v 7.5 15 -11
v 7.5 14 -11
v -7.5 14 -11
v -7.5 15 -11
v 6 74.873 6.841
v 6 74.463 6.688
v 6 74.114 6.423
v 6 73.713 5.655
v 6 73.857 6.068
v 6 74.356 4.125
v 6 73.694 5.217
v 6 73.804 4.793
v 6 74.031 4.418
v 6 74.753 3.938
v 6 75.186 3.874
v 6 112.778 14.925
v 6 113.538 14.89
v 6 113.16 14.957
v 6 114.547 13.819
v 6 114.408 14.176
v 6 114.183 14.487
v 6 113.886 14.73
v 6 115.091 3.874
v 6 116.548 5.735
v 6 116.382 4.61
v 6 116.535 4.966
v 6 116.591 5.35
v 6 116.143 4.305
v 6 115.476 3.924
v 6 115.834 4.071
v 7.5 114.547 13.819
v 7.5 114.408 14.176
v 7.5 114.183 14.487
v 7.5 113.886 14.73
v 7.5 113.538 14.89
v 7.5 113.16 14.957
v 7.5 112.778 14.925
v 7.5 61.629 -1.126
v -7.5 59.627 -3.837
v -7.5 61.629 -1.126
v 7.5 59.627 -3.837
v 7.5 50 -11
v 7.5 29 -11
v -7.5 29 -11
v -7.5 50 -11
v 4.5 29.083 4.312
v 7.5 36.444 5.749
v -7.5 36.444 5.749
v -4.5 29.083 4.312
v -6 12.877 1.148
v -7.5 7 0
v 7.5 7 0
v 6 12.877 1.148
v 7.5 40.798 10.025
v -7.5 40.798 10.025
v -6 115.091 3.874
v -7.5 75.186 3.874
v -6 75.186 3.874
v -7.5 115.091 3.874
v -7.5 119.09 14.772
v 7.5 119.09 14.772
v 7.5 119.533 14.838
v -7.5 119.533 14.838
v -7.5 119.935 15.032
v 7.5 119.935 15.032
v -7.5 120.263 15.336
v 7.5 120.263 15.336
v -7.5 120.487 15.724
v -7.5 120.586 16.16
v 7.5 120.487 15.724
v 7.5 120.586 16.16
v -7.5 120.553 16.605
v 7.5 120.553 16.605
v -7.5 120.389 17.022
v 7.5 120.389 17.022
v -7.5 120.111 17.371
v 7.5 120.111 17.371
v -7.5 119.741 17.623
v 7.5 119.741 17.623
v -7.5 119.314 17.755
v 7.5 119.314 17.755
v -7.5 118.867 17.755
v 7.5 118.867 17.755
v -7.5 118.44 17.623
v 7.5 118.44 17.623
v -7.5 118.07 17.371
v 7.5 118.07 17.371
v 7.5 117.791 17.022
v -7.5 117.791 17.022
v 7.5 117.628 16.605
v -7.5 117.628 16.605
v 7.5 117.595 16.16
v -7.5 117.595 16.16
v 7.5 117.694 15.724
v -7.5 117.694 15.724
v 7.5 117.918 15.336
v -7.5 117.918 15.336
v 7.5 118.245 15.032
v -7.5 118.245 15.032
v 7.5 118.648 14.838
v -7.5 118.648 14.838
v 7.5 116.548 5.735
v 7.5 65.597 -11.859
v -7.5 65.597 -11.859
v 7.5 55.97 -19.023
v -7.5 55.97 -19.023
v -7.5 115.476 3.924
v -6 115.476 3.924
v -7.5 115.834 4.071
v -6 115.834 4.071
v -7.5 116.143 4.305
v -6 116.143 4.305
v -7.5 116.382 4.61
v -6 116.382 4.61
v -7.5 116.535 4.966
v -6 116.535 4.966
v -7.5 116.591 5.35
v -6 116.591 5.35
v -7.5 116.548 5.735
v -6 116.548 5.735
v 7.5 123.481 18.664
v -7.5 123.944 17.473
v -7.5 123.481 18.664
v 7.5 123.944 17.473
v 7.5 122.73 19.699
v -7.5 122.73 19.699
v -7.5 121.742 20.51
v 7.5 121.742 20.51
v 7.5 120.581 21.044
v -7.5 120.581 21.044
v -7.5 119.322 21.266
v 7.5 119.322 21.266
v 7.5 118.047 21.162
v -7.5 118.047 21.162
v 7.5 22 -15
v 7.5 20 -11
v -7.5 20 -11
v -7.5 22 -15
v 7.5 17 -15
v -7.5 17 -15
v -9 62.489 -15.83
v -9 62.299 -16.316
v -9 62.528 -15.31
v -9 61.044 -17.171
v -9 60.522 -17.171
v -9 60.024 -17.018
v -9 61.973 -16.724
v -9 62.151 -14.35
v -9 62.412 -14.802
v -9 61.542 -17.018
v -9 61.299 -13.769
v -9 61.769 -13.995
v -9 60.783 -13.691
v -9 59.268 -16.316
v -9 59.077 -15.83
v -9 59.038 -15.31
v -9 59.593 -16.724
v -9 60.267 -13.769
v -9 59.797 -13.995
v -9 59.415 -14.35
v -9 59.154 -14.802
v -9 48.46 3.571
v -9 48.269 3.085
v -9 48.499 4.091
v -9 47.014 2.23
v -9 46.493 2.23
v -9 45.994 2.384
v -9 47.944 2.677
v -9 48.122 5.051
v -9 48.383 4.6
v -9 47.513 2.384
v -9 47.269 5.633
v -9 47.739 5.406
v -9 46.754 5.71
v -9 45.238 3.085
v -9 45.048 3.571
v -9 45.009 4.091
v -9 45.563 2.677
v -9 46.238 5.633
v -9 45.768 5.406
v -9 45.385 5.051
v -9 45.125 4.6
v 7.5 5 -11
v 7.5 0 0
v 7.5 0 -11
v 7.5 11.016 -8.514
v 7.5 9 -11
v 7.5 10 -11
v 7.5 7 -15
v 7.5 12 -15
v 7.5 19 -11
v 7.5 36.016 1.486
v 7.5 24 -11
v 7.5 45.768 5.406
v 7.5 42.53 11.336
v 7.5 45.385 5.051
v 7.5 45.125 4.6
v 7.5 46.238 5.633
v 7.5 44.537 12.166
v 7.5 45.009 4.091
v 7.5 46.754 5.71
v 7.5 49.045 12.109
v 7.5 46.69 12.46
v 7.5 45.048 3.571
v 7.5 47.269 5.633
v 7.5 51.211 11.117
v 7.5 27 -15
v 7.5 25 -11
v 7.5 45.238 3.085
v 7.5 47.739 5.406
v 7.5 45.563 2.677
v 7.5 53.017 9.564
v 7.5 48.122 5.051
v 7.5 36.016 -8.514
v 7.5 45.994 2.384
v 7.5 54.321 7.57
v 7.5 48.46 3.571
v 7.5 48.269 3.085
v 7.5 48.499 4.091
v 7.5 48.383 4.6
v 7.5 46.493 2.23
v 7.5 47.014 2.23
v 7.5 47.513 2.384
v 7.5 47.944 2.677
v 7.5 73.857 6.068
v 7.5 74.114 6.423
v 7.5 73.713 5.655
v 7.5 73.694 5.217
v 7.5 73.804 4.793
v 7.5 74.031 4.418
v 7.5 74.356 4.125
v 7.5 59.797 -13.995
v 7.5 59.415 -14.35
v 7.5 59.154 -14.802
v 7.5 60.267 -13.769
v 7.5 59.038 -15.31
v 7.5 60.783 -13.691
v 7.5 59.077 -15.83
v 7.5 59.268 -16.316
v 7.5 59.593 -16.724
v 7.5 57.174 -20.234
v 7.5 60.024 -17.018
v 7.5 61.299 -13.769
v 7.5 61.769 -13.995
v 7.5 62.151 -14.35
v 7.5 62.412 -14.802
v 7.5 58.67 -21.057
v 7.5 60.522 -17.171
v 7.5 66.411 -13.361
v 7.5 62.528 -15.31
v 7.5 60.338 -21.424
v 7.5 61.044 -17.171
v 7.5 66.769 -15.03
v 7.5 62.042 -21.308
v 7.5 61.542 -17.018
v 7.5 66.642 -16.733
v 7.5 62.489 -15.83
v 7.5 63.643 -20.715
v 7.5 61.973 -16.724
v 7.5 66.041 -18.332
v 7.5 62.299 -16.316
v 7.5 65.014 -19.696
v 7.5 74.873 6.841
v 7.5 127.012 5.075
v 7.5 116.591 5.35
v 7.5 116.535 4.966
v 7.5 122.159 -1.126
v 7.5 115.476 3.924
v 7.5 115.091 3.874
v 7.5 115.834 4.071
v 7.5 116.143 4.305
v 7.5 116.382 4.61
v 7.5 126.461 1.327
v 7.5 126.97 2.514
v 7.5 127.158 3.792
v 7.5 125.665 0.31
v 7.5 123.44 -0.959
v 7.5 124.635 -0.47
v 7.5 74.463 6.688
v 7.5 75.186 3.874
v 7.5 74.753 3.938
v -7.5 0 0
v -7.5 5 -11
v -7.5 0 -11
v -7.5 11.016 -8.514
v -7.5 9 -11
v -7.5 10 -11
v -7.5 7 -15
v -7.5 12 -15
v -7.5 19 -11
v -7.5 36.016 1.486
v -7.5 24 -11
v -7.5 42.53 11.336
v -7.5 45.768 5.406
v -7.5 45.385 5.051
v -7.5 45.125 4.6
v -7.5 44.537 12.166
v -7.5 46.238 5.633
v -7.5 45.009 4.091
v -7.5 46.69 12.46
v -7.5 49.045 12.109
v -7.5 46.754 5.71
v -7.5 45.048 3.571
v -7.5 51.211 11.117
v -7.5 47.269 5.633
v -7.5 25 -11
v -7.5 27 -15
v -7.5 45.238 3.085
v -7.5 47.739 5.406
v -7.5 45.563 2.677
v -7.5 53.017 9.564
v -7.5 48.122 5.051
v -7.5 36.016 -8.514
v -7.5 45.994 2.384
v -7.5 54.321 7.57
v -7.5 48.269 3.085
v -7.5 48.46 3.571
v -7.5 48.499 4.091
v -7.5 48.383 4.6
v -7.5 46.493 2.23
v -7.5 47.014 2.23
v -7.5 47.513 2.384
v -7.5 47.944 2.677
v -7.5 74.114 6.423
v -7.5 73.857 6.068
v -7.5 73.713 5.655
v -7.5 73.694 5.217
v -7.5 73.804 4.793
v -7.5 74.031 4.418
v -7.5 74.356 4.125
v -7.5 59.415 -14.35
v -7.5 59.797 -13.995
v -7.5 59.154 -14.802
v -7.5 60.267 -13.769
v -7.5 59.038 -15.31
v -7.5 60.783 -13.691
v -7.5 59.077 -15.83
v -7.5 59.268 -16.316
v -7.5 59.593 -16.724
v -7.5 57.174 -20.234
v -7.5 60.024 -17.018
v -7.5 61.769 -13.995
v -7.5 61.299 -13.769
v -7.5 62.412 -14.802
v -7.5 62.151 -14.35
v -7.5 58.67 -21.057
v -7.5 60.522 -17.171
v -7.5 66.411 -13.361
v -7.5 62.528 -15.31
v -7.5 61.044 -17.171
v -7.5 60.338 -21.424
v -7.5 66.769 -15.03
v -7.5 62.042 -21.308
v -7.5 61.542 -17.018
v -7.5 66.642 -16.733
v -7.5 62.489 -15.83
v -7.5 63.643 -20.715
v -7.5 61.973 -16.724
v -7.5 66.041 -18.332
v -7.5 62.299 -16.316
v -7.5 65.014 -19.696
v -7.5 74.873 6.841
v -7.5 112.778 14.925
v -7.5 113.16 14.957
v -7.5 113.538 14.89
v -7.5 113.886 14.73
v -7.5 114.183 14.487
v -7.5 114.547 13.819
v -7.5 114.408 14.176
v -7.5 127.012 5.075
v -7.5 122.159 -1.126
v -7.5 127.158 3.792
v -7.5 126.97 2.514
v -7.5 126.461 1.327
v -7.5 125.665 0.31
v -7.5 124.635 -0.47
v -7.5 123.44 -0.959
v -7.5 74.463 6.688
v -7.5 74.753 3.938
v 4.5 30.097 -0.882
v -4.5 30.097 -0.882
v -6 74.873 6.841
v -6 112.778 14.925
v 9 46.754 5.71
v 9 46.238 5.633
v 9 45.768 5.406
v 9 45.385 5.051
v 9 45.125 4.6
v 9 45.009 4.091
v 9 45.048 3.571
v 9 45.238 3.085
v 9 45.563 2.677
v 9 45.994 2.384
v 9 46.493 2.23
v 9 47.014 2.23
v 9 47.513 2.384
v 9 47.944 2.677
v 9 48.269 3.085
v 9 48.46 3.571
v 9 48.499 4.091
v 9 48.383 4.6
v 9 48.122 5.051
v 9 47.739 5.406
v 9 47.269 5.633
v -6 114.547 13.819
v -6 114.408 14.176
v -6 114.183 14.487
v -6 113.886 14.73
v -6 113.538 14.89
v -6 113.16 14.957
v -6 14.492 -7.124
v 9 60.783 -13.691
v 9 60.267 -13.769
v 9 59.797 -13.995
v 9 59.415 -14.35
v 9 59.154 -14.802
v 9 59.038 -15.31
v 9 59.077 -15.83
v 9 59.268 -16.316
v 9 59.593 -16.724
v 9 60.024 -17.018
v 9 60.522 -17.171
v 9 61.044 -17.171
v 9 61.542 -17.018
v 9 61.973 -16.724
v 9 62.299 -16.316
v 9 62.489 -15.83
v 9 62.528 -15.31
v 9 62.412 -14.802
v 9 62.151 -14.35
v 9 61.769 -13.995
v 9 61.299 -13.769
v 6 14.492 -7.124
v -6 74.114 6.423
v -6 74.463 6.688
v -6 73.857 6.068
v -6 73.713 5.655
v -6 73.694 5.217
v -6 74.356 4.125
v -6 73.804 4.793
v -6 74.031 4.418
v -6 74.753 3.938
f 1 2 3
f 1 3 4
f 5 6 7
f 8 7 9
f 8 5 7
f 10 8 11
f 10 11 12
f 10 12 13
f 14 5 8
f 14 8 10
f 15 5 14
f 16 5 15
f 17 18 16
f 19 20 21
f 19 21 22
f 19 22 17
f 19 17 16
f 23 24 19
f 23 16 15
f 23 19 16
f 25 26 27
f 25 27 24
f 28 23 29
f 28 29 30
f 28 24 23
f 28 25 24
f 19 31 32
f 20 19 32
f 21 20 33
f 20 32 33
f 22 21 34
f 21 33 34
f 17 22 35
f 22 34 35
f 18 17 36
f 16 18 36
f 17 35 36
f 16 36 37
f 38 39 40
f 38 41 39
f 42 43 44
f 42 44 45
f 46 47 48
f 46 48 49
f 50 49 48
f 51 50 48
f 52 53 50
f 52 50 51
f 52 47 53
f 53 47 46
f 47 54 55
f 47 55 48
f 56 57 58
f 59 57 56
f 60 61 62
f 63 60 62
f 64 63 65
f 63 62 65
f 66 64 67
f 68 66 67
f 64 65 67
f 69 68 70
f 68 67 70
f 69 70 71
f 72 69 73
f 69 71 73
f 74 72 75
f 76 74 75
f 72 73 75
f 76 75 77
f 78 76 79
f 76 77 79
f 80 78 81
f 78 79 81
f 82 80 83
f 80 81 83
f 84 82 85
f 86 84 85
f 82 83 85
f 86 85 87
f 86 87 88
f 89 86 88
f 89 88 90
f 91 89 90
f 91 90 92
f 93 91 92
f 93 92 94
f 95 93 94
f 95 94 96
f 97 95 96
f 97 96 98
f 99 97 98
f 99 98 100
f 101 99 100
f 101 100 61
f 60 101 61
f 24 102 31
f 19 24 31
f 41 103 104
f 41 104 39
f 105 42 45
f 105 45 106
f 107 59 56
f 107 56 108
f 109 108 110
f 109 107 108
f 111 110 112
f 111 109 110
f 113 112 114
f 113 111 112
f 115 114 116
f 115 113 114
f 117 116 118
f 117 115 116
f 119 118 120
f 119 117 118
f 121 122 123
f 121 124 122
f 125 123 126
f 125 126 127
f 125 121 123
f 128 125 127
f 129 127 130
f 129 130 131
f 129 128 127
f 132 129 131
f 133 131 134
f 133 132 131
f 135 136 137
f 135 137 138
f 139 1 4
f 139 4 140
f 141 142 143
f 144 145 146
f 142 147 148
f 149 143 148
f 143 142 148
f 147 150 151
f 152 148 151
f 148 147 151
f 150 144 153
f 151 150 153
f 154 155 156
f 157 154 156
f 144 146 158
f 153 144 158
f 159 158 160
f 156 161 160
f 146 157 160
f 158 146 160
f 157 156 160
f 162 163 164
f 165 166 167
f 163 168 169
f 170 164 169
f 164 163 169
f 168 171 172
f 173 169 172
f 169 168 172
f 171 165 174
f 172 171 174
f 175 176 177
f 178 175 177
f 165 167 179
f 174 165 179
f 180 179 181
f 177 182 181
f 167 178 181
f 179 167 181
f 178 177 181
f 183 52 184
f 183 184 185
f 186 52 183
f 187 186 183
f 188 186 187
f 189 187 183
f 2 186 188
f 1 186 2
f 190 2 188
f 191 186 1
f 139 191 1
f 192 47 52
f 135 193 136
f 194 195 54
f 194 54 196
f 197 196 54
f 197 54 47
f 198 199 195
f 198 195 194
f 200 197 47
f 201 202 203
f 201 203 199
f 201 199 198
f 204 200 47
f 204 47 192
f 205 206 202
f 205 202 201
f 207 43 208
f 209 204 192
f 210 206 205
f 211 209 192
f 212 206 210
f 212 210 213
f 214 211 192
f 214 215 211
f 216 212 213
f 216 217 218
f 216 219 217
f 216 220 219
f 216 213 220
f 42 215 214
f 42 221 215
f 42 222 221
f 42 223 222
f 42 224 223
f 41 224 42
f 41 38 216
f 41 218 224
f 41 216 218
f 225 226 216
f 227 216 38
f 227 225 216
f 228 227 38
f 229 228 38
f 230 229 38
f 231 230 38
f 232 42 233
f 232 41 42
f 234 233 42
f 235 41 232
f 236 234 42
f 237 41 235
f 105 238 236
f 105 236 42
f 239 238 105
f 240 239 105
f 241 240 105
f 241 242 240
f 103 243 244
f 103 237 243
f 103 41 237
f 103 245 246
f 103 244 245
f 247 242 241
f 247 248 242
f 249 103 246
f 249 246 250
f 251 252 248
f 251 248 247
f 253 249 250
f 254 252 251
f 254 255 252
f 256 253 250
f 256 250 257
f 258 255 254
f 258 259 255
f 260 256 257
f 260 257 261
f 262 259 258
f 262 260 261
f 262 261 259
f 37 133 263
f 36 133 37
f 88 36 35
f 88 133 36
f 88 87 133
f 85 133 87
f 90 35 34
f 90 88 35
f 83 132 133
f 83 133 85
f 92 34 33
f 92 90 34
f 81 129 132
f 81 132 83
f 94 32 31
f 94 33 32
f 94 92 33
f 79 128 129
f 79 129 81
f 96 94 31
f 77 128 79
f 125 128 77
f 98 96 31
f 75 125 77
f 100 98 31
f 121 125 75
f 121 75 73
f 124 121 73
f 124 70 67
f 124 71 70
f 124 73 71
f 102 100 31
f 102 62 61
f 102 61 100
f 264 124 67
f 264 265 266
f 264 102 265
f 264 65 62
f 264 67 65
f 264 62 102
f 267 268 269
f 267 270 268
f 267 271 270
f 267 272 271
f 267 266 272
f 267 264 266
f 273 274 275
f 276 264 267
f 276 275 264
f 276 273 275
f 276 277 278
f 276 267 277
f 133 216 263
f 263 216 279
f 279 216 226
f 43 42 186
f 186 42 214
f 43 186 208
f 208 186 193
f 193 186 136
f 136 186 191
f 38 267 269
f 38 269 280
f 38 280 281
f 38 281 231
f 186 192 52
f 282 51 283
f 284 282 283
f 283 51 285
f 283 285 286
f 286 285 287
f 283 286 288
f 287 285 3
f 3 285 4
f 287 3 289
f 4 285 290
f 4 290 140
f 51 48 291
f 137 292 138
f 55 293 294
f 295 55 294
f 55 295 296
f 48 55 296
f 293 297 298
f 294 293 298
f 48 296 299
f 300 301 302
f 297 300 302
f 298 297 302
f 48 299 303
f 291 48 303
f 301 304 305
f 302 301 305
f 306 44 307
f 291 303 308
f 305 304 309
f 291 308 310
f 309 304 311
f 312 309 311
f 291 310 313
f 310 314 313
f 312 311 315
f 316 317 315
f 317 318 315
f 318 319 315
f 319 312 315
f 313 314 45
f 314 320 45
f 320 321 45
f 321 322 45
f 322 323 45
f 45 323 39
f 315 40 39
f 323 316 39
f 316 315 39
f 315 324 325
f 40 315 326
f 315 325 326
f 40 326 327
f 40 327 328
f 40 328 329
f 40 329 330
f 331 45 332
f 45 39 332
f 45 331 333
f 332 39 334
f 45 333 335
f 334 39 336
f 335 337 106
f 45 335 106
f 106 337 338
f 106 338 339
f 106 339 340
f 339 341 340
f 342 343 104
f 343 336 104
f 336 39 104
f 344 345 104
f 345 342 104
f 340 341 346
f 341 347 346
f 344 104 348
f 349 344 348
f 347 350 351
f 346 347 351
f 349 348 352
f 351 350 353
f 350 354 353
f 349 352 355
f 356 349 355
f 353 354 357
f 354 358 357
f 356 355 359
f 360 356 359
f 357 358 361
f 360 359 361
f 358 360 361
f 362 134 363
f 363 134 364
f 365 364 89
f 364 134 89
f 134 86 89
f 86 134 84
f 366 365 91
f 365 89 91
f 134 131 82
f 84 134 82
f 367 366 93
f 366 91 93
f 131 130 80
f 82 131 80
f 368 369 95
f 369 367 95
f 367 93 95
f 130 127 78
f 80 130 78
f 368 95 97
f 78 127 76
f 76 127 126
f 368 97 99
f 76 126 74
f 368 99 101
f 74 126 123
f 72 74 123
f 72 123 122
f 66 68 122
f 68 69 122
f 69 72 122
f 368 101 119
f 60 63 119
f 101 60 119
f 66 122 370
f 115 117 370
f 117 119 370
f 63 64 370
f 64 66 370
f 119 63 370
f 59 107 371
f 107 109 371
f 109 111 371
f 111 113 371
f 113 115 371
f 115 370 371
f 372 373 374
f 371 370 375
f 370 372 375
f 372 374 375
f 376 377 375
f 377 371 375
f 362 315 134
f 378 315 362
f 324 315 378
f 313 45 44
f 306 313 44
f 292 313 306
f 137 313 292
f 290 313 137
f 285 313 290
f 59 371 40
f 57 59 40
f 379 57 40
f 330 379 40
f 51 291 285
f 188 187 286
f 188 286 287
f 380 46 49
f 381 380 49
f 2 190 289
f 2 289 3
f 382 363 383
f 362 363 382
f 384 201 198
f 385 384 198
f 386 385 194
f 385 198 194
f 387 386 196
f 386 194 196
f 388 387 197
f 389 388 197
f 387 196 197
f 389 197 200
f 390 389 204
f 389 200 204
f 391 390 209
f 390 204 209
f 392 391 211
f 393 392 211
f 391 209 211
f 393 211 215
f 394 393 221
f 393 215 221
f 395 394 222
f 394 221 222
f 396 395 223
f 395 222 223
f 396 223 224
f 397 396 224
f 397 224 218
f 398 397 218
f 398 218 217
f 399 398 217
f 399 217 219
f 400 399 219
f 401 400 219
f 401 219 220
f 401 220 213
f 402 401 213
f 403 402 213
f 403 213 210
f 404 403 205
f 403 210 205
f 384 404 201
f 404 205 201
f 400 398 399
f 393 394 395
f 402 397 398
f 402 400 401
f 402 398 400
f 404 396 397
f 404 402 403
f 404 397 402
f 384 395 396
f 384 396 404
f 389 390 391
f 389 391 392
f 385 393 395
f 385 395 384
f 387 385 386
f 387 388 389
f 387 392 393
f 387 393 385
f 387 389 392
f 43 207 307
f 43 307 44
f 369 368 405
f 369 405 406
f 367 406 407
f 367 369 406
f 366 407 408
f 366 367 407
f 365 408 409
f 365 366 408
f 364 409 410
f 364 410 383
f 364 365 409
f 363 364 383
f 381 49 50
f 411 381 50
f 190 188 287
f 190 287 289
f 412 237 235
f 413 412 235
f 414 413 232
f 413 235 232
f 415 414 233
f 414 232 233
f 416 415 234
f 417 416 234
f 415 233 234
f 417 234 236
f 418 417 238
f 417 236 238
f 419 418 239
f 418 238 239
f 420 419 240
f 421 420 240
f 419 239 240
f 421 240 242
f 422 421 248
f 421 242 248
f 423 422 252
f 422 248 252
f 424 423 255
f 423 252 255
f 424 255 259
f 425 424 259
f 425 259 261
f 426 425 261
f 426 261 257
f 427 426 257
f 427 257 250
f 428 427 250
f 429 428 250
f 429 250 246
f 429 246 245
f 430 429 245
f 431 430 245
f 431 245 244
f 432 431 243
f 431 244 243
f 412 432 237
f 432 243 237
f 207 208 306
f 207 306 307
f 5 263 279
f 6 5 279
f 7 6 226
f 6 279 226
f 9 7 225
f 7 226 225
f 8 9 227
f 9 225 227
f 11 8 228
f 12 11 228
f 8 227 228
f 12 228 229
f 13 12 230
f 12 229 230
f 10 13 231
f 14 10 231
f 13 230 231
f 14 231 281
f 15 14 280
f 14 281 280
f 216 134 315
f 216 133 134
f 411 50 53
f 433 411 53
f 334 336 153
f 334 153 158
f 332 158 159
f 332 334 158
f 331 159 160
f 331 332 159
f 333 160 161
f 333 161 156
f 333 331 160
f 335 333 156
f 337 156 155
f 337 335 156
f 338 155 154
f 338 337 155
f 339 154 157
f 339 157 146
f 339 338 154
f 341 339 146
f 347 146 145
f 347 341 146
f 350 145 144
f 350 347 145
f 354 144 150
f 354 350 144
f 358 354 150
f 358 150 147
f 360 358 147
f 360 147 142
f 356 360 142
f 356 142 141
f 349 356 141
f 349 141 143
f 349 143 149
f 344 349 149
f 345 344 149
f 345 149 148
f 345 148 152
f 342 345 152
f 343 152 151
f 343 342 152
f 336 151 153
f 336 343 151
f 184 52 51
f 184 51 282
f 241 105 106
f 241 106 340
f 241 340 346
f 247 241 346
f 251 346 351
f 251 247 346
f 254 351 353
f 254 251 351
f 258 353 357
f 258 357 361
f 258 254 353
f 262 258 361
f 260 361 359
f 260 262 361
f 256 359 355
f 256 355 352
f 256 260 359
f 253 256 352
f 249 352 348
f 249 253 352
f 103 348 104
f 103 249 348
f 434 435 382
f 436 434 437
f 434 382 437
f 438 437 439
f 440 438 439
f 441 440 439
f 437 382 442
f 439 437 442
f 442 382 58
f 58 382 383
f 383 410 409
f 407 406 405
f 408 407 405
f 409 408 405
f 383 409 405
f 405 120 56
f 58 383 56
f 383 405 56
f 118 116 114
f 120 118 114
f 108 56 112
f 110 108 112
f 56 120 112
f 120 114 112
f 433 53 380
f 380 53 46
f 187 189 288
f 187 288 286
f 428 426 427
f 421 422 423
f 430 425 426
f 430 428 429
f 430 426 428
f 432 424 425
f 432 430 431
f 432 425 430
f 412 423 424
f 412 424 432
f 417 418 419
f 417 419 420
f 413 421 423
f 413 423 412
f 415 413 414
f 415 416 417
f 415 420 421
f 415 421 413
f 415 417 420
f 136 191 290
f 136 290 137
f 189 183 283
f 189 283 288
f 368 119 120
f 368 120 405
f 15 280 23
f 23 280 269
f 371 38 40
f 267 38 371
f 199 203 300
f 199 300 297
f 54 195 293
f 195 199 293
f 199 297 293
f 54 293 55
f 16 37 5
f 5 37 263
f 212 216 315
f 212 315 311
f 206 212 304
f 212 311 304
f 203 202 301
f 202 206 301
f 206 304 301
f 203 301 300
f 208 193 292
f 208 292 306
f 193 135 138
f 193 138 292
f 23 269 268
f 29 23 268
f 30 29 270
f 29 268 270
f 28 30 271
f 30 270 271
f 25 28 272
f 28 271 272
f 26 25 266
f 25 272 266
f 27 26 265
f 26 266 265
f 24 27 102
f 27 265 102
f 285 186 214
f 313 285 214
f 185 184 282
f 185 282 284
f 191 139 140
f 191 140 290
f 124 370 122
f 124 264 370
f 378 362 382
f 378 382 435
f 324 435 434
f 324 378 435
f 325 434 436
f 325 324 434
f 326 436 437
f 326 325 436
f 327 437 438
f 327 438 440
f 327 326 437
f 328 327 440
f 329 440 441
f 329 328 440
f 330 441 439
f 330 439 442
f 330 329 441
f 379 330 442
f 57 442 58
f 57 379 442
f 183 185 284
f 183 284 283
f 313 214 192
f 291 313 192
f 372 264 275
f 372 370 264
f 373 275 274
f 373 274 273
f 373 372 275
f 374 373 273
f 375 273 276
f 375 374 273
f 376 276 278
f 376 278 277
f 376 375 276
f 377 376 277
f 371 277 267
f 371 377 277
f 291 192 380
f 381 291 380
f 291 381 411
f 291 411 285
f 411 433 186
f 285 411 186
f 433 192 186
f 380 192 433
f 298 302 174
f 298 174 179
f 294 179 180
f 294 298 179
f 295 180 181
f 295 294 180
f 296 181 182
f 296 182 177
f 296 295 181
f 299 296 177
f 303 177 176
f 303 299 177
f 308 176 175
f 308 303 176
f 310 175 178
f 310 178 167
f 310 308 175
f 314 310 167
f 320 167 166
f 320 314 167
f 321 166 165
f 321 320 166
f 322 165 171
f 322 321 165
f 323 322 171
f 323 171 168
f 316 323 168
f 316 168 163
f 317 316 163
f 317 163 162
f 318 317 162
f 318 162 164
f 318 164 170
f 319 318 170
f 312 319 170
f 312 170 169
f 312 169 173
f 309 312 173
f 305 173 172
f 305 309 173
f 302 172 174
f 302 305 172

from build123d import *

# Parameters (mm, degrees)
BOSS_EXTRUDE1_DEPTH = 7.5
BOSS_EXTRUDE2_DEPTH = 15
LPATTERN1_COUNT     = 5
LPATTERN1_PITCH     = 5
CUT_EXTRUDE1_DEPTH  = 132.304814948
FILLET1_R           = 8.5
FILLET2_R           = 5
SKETCH4_R           = 1.5
CUT_EXTRUDE2_DEPTH  = 130.82329799
CUT_EXTRUDE3_REACH  = 131.114
SKETCH6_R           = 1.75
BOSS_EXTRUDE3_DEPTH = 1.5
SKETCH7_R           = 1.75
BOSS_EXTRUDE4_DEPTH = 1.5
CUT_EXTRUDE4_DEPTH  = 1.5


with BuildPart() as part:
    # Sketch1 → Boss-Extrude1 (new, symmetric)
    with BuildSketch(Plane(origin=(0, 0, 0), x_dir=(0, 0, -1), z_dir=(1, 0, 0))):
        with BuildLine():
            Line((1.125844004, 128.547240234), (-22.171185278, 122.781095368))
            Line((-22.171185278, 122.781095368), (-7.570249068, 54.320795472))
            Line((-7.570249068, 54.320795472), (-12.460270489, 53.277871457))
            Line((-12.460270489, 53.277871457), (-12.460270489, 43.277871457))
            Line((-12.460270489, 43.277871457), (-5.749067667, 36.443984461))
            Line((-5.749067667, 36.443984461), (0, 7))
            Line((0, 7), (0, 0))
            Line((0, 0), (11, 0))
            Line((11, 0), (11, 50))
            Line((11, 50), (19.022755483, 55.969538882))
            ThreePointArc((19.022755483, 55.969538882), (20.254685443, 64.364915501), (11.859308824, 65.596845461))
            Line((11.859308824, 65.596845461), (3.836553342, 59.627306579))
            Line((3.836553342, 59.627306579), (1.125844004, 61.629450689))
            Line((1.125844004, 61.629450689), (1.125844004, 128.547240234))
        make_face()
    extrude(amount=BOSS_EXTRUDE1_DEPTH, both=True)

    # Sketch2 → Boss-Extrude2 (add)
    with BuildSketch(Plane(origin=(7.5, 0, 0), x_dir=(0, 0, -1), z_dir=(1, 0, 0))):
        Polygon((11, 5), (15, 7), (11, 9), align=None)
    boss_extrude2 = extrude(amount=-BOSS_EXTRUDE2_DEPTH)

    # LPattern1: Boss-Extrude2 ×5
    with Locations(*[(0, i * LPATTERN1_PITCH, 0) for i in range(1, LPATTERN1_COUNT)]):
        add(boss_extrude2)

    # Sketch3 → Cut-Extrude1 (cut, through all)
    with BuildSketch(Plane(origin=(7.5, 0, 0), x_dir=(0, 0, -1), z_dir=(1, 0, 0))):
        Polygon((8.514249155, 11.015619925), (8.514249155, 36.015619925), (-1.485750845, 36.015619925), align=None)
    extrude(amount=-CUT_EXTRUDE1_DEPTH, mode=Mode.SUBTRACT)

    # Fillet1
    # the kernel refuses this fillet: 8.5 mm, written as the material it takes off along each edge
    with BuildSketch(Plane(origin=(-16.189504631, 43.277871457, 12.460270489), x_dir=(0, 1, 0), z_dir=(1, 0, 0))) as fillet1_piece_1:
        with BuildLine():
            CenterArc((FILLET1_R * 0.408917864968, -FILLET1_R), FILLET1_R, 90, 44.481059687)
            Line((-FILLET1_R * 0.29175558125, -FILLET1_R * 0.286517889667), (-FILLET1_R * 0.305769050174, -FILLET1_R * 0.27224824746))
            Line((-FILLET1_R * 0.305769050174, -FILLET1_R * 0.27224824746), (-FILLET1_R * 0.00817835729936, FILLET1_R * 0.02))
            Line((-FILLET1_R * 0.00817835729936, FILLET1_R * 0.02), (FILLET1_R * 0.408917864968, FILLET1_R * 0.02))
            Line((FILLET1_R * 0.408917864968, FILLET1_R * 0.02), (FILLET1_R * 0.408917864968, 0))
        make_face()
    extrude(amount=32.379009261, mode=Mode.SUBTRACT)
    with BuildSketch(Plane(origin=(-24.131006979, 53.277871457, 12.460270489), x_dir=(0, 0.20858480299843193, -0.9780042842227765), z_dir=(1, 0, 0))) as fillet1_piece_2:
        with BuildLine():
            CenterArc((6.92544629, -8.279049256), FILLET1_R, 103.092457682, 64.868111345)
            Line((-1.387590126, -6.506078431), (-1.553850854, -6.470619014))
            Line((-1.553850854, -6.470619014), (-0.166260728, 0.035459417))
            Line((-0.166260728, 0.035459417), (0, 0.17))
            ThreePointArc((0, 0.17), (2.5, 0.17), (4.961491074, 0.165580985))
            Line((4.961491074, 0.165580985), (5, 0))
        make_face()
    extrude(amount=48.262013958, mode=Mode.SUBTRACT)

    # Fillet2
    fillet2_edges = [part.edges().sort_by_distance(p)[0] for p in [
        (0, 122.781095368, 22.171185278),
        (0, 128.547240234, -1.125844004),
    ]]
    fillet(fillet2_edges, radius=FILLET2_R)

    # Sketch4 → Cut-Extrude2 (cut, through all)
    with BuildSketch(Plane(origin=(7.5, 0, 0), x_dir=(0, 0, -1), z_dir=(1, 0, 0))):
        with Locations((-16.271597688, 119.090404926)):
            Circle(SKETCH4_R)
    extrude(amount=-CUT_EXTRUDE2_DEPTH, mode=Mode.SUBTRACT)

    # Cut-Extrude3: up to this plane
    cut_extrude3_end = Plane(origin=(-7.5, 36.015619925, 1.485750845), z_dir=(0, -0.3713906763541038, 0.9284766908852593))
    # Sketch5 → Cut-Extrude3 (cut, up to the surface)
    with BuildSketch(Plane(origin=(0, 0.257069393, -1.316586904), x_dir=(1, 0, 0), z_dir=(0, -0.19163558890630344, 0.9814661487104557)), mode=Mode.PRIVATE) as cut_extrude3_sk1:
        Polygon((4.5, 29.370263041), (-4.5, 29.370263041), (-6, 12.858555839), (6, 12.858555839), align=None)
    cut_extrude3_tool1 = split(extrude(cut_extrude3_sk1.sketch, amount=-CUT_EXTRUDE3_REACH, mode=Mode.PRIVATE), bisect_by=cut_extrude3_end, keep=Keep.BOTH, mode=Mode.PRIVATE)
    add(cut_extrude3_tool1.solids().sort_by_distance((0, 20.594298, 2.654347))[0], mode=Mode.SUBTRACT)

    # Sketch6 → Boss-Extrude3 (add)
    with BuildSketch(Plane(origin=(7.5, 0, 0), x_dir=(0, 0, -1), z_dir=(1, 0, 0))):
        with Locations(Location((15.441032154, 60.783192172, 0), (0, 0, 180))):
            Circle(SKETCH6_R)
    boss_extrude3 = extrude(amount=BOSS_EXTRUDE3_DEPTH)

    # Sketch7 → Boss-Extrude4 (add)
    with BuildSketch(Plane(origin=(7.5, 0, 0), x_dir=(0, 0, -1), z_dir=(1, 0, 0))):
        with Locations(Location((-3.960270489, 46.753673309, 0), (0, 0, 180))):
            Circle(SKETCH7_R)
    boss_extrude4 = extrude(amount=BOSS_EXTRUDE4_DEPTH)

    # Sketch8 → Cut-Extrude4 (cut)
    with BuildSketch(Plane(origin=(7.5, 0, 0), x_dir=(0, 0, -1), z_dir=(1, 0, 0))):
        with BuildLine():
            Line((-14.925252721, 112.777715187), (-6.841162422, 74.873348079))
            ThreePointArc((-6.841162422, 74.873348079), (-5.216849988, 73.694496481), (-3.874155996, 75.186225283))
            Line((-3.874155996, 75.186225283), (-3.874155996, 115.091449891))
            ThreePointArc((-3.874155996, 115.091449891), (-4.449649663, 116.272673004), (-5.73454005, 116.547514222))
            Line((-5.73454005, 116.547514222), (-13.818630348, 114.546656721))
            ThreePointArc((-13.818630348, 114.546656721), (-14.729909587, 113.886125212), (-14.925252721, 112.777715187))
        make_face()
    cut_extrude4 = extrude(amount=-CUT_EXTRUDE4_DEPTH, mode=Mode.SUBTRACT)

    # Mirror1: Boss-Extrude3, Boss-Extrude4, Cut-Extrude4 across plane
    add(boss_extrude3.mirror(Plane(origin=(0, 0, 0), x_dir=(0, 0, 1), z_dir=(1, 0, 0))))
    add(boss_extrude4.mirror(Plane(origin=(0, 0, 0), x_dir=(0, 0, 1), z_dir=(1, 0, 0))))
    add(cut_extrude4.mirror(Plane(origin=(0, 0, 0), x_dir=(0, 0, 1), z_dir=(1, 0, 0))), mode=Mode.SUBTRACT)


solid = part.part
